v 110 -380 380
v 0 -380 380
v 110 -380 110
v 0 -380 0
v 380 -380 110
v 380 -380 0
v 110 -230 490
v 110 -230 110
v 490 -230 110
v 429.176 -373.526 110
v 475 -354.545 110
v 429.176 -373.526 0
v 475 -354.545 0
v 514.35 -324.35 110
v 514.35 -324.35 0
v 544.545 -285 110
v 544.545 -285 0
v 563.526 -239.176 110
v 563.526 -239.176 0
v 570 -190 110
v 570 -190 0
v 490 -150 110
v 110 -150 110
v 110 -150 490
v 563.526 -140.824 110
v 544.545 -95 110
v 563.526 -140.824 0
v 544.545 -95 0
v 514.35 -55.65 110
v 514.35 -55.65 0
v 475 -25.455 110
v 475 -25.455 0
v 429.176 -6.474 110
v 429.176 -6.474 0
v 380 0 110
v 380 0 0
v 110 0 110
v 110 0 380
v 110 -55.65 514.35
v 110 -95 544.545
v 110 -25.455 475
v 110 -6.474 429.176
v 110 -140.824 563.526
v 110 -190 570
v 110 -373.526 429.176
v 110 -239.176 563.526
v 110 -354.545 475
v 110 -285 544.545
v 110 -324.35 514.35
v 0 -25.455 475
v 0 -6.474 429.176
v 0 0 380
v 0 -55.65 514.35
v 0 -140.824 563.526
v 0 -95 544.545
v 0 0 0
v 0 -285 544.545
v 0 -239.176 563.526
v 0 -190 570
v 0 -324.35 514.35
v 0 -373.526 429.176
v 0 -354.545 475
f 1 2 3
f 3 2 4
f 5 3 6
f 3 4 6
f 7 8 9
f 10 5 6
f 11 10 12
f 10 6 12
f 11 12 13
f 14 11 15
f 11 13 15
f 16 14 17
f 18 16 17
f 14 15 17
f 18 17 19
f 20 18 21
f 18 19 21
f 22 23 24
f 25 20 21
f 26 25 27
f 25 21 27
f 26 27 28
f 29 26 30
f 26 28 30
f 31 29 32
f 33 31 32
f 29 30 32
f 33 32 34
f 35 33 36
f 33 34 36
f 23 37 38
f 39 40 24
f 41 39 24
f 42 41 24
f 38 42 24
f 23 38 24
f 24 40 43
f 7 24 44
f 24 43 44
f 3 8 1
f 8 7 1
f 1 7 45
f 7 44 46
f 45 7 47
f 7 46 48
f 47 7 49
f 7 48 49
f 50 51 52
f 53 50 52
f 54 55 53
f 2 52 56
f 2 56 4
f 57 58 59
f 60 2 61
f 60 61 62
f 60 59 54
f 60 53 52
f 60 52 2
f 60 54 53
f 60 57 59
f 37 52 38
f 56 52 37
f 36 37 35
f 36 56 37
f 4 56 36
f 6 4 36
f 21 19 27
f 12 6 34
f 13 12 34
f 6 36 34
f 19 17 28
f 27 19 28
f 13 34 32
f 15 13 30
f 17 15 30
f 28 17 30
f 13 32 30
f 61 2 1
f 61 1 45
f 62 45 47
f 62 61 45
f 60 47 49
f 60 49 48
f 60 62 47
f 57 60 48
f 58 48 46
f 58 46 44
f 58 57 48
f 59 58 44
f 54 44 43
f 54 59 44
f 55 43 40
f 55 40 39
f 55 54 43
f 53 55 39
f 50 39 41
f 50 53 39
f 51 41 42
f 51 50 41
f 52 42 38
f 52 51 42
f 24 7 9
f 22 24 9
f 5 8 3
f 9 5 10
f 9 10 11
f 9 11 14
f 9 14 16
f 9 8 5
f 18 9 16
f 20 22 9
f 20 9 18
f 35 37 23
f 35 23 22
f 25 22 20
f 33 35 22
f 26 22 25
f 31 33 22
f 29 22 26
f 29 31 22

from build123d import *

# Parameters (mm, degrees)
F1_DEPTH = 110
F2_W     = 110
F2_H     = 380
F3_DEPTH = 270
F5_DEPTH = 110
F6_W     = 380
F6_H     = 40
F7_DEPTH = 380
F9_DEPTH = 230.001


with BuildPart() as f1:
    # F0 (on Top) → F1 (new body)
    with BuildSketch(Plane.XY):
        with BuildLine():
            Line((380, 0), (0, 0))
            Line((0, 0), (0, -380))
            Line((0, -380), (110, -380))
            Line((110, -380), (380, -380))
            ThreePointArc((380, -380), (190, -190), (380, 0))
        make_face()
        with BuildLine():
            Line((380, -380), (380, 0))
            ThreePointArc((380, 0), (190, -190), (380, -380))
        make_face()
        with BuildLine():
            ThreePointArc((570, -190), (514.3502884254, -55.6497115746), (380, 0))
            Line((380, 0), (380, -380))
            ThreePointArc((380, -380), (514.3502884254, -324.3502884254), (570, -190))
        make_face()
    extrude(amount=F1_DEPTH)

    # F2 (on face) → F3 (join)
    with BuildSketch(Plane.XY.offset(110)):
        with Locations((55, -190)):
            Rectangle(F2_W, F2_H)
    extrude(amount=F3_DEPTH)

    # F4 (on face) → F5 (join)
    with BuildSketch(Plane(origin=(0, 0, 0), x_dir=(0, -1, 0), z_dir=(-1, 0, 0))):
        with BuildLine():
            Line((0, 380), (380, 380))
            ThreePointArc((380, 380), (190, 570), (0, 380))
        make_face()
    extrude(amount=-F5_DEPTH)

    # F6 (on face) → F7 (join)
    with BuildSketch(Plane.XY.offset(110)):
        with Locations((300, -210)):
            Rectangle(F6_W, F6_H)
        with Locations((300, -170)):
            Rectangle(F6_W, F6_H)
    extrude(amount=F7_DEPTH)

    # F8 (on face) → F9 (cut, through all)
    with BuildSketch(Plane.XZ.offset(230)):
        Polygon((490, 490), (110, 490), (490, 110), align=None)
    extrude(amount=-F9_DEPTH, mode=Mode.SUBTRACT)


solid = f1.part
